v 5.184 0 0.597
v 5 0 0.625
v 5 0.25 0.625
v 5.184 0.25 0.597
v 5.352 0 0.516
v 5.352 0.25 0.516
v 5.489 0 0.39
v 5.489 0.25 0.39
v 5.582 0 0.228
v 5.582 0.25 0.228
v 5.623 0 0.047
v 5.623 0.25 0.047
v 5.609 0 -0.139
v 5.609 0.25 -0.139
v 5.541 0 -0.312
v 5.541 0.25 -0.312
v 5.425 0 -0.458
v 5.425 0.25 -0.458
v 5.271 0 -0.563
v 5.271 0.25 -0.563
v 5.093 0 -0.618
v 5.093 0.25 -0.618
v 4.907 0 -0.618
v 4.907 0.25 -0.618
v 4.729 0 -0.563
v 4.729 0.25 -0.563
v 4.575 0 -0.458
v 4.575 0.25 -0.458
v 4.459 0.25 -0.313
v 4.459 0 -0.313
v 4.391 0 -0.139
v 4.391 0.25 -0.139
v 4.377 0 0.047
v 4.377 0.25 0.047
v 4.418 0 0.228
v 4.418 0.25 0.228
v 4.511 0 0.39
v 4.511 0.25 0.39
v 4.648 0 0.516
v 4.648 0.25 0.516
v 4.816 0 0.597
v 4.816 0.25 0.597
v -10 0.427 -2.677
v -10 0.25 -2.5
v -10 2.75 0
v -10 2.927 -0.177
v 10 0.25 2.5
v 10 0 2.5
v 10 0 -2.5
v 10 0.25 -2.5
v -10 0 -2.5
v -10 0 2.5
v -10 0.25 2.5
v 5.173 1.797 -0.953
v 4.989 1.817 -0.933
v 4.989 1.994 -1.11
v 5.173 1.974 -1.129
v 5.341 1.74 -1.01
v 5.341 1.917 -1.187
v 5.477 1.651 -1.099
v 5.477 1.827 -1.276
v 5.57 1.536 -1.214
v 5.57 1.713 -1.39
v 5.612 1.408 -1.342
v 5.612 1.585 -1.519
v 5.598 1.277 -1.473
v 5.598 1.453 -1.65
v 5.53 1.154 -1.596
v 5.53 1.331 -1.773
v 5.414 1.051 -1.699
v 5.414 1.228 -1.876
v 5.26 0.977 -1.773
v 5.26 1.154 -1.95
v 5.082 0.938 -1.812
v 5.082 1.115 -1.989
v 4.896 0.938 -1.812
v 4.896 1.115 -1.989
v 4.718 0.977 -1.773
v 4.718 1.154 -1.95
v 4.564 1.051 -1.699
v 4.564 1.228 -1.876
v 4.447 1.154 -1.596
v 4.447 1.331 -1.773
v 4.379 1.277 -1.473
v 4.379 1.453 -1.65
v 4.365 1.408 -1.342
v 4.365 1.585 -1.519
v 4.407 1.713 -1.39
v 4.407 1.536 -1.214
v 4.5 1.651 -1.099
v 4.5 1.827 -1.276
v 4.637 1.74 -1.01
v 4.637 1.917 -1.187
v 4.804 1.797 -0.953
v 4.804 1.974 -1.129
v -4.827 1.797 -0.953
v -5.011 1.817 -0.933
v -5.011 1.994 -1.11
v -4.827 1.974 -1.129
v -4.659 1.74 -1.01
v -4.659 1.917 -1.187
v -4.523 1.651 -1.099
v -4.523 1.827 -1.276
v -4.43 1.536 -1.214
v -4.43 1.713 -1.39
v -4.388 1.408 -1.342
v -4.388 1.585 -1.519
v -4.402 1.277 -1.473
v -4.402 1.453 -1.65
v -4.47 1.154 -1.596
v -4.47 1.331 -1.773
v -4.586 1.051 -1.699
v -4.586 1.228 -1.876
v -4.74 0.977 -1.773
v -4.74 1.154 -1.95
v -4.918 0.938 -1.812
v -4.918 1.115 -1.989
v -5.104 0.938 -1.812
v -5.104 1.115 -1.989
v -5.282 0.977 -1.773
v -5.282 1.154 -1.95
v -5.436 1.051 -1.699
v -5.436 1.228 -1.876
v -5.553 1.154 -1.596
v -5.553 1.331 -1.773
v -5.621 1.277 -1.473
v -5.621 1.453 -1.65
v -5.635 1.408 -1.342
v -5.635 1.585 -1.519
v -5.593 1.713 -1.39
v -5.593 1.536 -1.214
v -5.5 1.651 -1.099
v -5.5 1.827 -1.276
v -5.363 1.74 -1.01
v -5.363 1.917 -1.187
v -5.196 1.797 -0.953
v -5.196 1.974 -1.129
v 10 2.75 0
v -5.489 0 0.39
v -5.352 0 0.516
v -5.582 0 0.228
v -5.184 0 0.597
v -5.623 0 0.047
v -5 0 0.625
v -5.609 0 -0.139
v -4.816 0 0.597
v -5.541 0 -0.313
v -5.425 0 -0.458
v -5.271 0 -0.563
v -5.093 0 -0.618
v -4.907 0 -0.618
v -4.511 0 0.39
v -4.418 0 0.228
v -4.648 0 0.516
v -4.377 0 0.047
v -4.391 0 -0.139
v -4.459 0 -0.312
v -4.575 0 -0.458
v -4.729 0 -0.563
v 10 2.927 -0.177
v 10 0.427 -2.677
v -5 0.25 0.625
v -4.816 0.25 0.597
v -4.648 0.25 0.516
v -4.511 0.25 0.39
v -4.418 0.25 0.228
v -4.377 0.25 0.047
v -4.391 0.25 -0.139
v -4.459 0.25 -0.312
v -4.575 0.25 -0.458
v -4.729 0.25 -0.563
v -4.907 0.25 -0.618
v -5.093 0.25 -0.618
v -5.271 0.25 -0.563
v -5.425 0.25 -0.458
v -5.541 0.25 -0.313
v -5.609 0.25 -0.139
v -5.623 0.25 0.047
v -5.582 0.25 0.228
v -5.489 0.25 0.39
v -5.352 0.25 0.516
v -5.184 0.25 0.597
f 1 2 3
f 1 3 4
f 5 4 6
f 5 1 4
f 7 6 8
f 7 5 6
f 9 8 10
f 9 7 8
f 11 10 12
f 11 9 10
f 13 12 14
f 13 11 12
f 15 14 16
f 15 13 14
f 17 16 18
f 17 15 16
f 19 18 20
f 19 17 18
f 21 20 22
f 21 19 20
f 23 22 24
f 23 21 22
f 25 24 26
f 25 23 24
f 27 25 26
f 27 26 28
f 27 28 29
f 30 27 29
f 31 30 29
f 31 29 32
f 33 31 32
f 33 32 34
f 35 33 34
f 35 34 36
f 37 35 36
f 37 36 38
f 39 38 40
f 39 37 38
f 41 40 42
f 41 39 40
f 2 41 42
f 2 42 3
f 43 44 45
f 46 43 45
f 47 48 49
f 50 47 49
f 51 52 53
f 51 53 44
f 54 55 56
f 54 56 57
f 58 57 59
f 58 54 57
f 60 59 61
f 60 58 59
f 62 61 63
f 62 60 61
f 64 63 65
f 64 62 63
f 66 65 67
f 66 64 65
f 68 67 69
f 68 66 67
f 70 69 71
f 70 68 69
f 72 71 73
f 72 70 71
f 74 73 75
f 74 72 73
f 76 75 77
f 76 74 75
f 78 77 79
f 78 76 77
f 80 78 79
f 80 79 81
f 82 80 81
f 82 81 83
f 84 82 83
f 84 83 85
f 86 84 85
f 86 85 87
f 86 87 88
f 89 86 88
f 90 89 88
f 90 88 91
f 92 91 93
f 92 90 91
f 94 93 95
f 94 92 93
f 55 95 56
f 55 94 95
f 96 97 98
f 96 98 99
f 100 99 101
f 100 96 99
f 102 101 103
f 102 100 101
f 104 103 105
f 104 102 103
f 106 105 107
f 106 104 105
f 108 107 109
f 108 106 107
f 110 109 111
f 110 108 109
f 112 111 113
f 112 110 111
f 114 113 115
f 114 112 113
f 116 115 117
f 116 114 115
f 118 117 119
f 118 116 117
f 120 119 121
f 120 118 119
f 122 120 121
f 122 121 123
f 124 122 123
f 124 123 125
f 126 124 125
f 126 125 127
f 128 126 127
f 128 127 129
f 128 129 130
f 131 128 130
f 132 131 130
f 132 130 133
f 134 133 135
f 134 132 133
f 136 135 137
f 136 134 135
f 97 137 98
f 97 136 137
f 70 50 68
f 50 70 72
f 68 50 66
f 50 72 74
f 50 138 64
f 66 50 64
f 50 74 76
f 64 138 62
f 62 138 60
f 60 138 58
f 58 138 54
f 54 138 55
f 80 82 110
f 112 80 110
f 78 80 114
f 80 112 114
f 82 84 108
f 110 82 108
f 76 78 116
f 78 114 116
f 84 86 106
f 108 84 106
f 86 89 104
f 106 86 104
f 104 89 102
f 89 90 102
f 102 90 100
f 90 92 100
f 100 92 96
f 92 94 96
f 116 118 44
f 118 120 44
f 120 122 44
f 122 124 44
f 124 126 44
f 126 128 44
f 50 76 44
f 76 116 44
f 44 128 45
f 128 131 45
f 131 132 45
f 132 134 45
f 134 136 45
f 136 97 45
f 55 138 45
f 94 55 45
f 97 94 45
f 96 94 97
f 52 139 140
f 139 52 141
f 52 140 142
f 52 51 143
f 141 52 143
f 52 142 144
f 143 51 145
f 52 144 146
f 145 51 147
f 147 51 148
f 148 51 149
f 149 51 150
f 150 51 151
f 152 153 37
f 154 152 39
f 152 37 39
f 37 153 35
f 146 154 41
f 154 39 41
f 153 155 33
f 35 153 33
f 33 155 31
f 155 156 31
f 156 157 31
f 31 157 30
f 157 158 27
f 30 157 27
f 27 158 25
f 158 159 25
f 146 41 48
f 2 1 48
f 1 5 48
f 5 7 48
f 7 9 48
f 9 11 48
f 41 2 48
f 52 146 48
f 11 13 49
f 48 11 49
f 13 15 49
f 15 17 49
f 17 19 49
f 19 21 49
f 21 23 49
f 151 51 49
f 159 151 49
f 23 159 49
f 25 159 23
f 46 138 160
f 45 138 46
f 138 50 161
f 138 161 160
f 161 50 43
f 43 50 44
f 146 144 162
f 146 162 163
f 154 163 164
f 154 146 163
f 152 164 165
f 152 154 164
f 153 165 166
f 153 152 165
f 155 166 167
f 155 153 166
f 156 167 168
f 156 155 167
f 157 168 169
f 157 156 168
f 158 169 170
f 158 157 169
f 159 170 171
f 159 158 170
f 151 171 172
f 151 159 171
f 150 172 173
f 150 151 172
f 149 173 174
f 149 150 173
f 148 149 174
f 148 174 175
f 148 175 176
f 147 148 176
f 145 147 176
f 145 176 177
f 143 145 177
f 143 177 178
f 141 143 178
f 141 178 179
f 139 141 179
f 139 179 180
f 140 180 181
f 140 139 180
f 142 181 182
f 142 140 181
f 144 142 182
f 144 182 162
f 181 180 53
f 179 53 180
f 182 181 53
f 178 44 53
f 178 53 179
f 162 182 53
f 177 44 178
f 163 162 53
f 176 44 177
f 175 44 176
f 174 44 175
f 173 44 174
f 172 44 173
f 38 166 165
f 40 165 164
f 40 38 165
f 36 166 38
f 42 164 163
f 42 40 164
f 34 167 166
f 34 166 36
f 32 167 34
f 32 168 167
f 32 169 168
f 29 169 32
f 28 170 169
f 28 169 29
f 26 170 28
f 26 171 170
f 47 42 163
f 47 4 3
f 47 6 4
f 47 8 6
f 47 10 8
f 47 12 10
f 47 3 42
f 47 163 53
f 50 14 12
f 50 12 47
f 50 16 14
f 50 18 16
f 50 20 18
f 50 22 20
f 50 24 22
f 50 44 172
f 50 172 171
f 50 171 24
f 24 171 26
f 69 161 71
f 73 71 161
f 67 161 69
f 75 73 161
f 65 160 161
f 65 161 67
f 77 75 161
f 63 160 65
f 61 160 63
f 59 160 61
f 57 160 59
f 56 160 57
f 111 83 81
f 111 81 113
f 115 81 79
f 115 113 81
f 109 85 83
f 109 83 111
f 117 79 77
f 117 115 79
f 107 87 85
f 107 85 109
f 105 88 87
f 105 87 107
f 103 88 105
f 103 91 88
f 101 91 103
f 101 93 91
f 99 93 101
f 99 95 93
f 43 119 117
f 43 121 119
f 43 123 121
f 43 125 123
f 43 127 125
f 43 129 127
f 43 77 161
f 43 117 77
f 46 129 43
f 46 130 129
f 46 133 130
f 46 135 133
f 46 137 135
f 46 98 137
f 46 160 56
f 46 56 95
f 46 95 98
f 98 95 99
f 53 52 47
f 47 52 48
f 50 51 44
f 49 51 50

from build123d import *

# Parameters (mm, degrees)
SKETCH2_W           = 20
SKETCH2_H           = 5
SKETCH2_R           = 0.625
BOSS_EXTRUDE1_DEPTH = 0.25
SKETCH5_W           = 20
SKETCH5_H           = 3.535533906
SKETCH5_R           = 0.625
BOSS_EXTRUDE5_DEPTH = 0.25


with BuildPart() as part:
    # Sketch2 → Boss-Extrude1 (new body)
    with BuildSketch(Plane(origin=(0, 0, 0), x_dir=(1, 0, 0), z_dir=(0, 1, 0))):
        Rectangle(SKETCH2_W, SKETCH2_H)
        with Locations(Location((-5, 0, 0), (0, 0, 270))):
            Circle(SKETCH2_R, mode=Mode.SUBTRACT)
        with Locations(Location((5, 0, 0), (0, 0, 270))):
            Circle(SKETCH2_R, mode=Mode.SUBTRACT)
    extrude(amount=BOSS_EXTRUDE1_DEPTH)


with BuildPart() as body_2:
    # Sketch5 → Boss-Extrude5 (new body)
    with BuildSketch(Plane(origin=(0, 1.375, -1.375), x_dir=(-1, 0, 0), z_dir=(0, 0.7071067811865464, -0.7071067811865488))):
        with Locations((0, 0.176776695)):
            Rectangle(SKETCH5_W, SKETCH5_H)
        with Locations(Location((-4.98869427, 0, 0), (0, 0, 90))):
            Circle(SKETCH5_R, mode=Mode.SUBTRACT)
        with Locations(Location((5.01130573, 0, 0), (0, 0, 90))):
            Circle(SKETCH5_R, mode=Mode.SUBTRACT)
    extrude(amount=BOSS_EXTRUDE5_DEPTH)


solid = Compound([part.part, body_2.part])
